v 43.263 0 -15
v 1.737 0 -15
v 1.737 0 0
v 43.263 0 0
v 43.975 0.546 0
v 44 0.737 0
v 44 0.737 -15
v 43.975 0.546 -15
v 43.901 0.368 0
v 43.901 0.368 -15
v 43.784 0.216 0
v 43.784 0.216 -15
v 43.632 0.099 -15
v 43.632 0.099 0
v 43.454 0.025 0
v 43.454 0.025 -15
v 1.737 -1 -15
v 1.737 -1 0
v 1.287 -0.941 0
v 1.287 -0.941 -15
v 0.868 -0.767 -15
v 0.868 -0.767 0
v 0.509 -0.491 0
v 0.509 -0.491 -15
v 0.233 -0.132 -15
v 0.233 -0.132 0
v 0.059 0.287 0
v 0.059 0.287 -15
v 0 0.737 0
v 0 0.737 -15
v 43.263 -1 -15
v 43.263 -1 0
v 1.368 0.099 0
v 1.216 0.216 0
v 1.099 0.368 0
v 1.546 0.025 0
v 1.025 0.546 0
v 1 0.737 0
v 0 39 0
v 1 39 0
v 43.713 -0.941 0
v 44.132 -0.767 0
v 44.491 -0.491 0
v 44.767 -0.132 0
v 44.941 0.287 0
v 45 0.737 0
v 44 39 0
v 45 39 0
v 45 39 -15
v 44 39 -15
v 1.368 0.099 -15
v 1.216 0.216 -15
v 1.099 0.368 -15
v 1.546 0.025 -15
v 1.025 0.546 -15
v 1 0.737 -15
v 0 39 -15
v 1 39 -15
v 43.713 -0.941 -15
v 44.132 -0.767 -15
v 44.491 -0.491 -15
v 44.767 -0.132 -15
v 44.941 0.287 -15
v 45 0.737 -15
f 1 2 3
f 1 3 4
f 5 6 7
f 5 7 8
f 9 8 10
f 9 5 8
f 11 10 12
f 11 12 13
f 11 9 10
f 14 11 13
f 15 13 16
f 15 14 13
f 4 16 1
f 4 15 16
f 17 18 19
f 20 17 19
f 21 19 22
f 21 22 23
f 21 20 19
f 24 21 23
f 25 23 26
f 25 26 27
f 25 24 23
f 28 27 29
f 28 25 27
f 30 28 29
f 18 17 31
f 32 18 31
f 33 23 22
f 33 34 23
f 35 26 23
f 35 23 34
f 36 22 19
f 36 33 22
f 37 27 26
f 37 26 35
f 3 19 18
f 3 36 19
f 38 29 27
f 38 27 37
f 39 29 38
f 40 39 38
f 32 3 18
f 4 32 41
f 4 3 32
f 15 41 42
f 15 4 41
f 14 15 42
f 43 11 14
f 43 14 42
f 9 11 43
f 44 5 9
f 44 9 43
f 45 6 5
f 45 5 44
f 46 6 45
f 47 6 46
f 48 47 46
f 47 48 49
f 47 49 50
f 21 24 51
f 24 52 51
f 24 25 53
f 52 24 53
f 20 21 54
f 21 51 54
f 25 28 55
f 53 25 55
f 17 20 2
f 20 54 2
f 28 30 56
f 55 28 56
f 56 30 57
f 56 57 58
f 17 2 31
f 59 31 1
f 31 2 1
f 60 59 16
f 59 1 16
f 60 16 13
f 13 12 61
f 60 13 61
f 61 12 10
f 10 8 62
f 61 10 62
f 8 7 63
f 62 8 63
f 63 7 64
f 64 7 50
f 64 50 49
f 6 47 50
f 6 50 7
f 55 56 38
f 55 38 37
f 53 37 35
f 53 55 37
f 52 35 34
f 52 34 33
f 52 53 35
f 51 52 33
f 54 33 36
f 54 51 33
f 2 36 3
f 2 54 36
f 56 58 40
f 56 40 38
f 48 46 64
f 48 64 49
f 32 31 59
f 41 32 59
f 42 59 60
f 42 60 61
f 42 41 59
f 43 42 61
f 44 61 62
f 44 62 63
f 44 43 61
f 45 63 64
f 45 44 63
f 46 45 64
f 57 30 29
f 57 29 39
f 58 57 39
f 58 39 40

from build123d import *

# Parameters (mm, degrees)
SKETCH_1_W                       = 45
SKETCH_1_H                       = 15
SM_BASE_FLANGE_1_DEPTH           = 1
SM_EDGE_FLANGE_1_STRIP_W         = 5.4732
SM_EDGE_FLANGE_1_STRIP_H         = 1
SM_EDGE_FLANGE_1_STRIP_CUT_DEPTH = 15
SM_EDGE_FLANGE_1_DEPTH           = 15
SM_EDGE_FLANGE_2_STRIP_W         = 5.4732
SM_EDGE_FLANGE_2_STRIP_H         = 1
SM_EDGE_FLANGE_2_STRIP_CUT_DEPTH = 15
SM_EDGE_FLANGE_2_DEPTH           = 15


# Sheet-metal steps are written as plain solids
with BuildPart() as part:
    # Sketch 1 → Базовая кромка1 (new body)
    with BuildSketch(Plane(origin=(0, 0, 0), x_dir=(1, 0, 0), z_dir=(0, 1, 0))):
        with Locations((22.5, 7.5)):
            Rectangle(SKETCH_1_W, SKETCH_1_H)
    extrude(amount=-SM_BASE_FLANGE_1_DEPTH)

    # Ребро-кромка1 strip (across the edge) → Ребро-кромка1 strip cut (cut)
    with BuildSketch(Plane.XY.offset(-15)):
        with Locations((-1, -0.5)):
            Rectangle(SM_EDGE_FLANGE_1_STRIP_W, SM_EDGE_FLANGE_1_STRIP_H)
    extrude(amount=SM_EDGE_FLANGE_1_STRIP_CUT_DEPTH, mode=Mode.SUBTRACT)

    # Ребро-кромка1 section (across the edge) → Ребро-кромка1 (add)
    with BuildSketch(Plane.XY.offset(-15)):
        with BuildLine():
            Line((0, 0.7366), (0, 39))
            Line((0, 39), (1, 39))
            Line((1, 39), (1, 0.7366))
            ThreePointArc((1, 0.7366), (1.215745145, 0.215745145), (1.7366, 0))
            Line((1.7366, 0), (1.7366, -1))
            ThreePointArc((1.7366, -1), (0.508638364, -0.491361636), (0, 0.7366))
        make_face()
    extrude(amount=SM_EDGE_FLANGE_1_DEPTH)

    # Ребро-кромка2 strip (across the edge) → Ребро-кромка2 strip cut (cut)
    with BuildSketch(Plane(origin=(45, 0, 0), x_dir=(-1, 0, 0), z_dir=(0, 0, -1))):
        with Locations((-1, -0.5)):
            Rectangle(SM_EDGE_FLANGE_2_STRIP_W, SM_EDGE_FLANGE_2_STRIP_H)
    extrude(amount=SM_EDGE_FLANGE_2_STRIP_CUT_DEPTH, mode=Mode.SUBTRACT)

    # Ребро-кромка2 section (across the edge) → Ребро-кромка2 (add)
    with BuildSketch(Plane(origin=(45, 0, 0), x_dir=(-1, 0, 0), z_dir=(0, 0, -1))):
        with BuildLine():
            Line((0, 0.7366), (0, 39))
            Line((0, 39), (1, 39))
            Line((1, 39), (1, 0.7366))
            ThreePointArc((1, 0.7366), (1.215745145, 0.215745145), (1.7366, 0))
            Line((1.7366, 0), (1.7366, -1))
            ThreePointArc((1.7366, -1), (0.508638364, -0.491361636), (0, 0.7366))
        make_face()
    extrude(amount=SM_EDGE_FLANGE_2_DEPTH)


solid = part.part
